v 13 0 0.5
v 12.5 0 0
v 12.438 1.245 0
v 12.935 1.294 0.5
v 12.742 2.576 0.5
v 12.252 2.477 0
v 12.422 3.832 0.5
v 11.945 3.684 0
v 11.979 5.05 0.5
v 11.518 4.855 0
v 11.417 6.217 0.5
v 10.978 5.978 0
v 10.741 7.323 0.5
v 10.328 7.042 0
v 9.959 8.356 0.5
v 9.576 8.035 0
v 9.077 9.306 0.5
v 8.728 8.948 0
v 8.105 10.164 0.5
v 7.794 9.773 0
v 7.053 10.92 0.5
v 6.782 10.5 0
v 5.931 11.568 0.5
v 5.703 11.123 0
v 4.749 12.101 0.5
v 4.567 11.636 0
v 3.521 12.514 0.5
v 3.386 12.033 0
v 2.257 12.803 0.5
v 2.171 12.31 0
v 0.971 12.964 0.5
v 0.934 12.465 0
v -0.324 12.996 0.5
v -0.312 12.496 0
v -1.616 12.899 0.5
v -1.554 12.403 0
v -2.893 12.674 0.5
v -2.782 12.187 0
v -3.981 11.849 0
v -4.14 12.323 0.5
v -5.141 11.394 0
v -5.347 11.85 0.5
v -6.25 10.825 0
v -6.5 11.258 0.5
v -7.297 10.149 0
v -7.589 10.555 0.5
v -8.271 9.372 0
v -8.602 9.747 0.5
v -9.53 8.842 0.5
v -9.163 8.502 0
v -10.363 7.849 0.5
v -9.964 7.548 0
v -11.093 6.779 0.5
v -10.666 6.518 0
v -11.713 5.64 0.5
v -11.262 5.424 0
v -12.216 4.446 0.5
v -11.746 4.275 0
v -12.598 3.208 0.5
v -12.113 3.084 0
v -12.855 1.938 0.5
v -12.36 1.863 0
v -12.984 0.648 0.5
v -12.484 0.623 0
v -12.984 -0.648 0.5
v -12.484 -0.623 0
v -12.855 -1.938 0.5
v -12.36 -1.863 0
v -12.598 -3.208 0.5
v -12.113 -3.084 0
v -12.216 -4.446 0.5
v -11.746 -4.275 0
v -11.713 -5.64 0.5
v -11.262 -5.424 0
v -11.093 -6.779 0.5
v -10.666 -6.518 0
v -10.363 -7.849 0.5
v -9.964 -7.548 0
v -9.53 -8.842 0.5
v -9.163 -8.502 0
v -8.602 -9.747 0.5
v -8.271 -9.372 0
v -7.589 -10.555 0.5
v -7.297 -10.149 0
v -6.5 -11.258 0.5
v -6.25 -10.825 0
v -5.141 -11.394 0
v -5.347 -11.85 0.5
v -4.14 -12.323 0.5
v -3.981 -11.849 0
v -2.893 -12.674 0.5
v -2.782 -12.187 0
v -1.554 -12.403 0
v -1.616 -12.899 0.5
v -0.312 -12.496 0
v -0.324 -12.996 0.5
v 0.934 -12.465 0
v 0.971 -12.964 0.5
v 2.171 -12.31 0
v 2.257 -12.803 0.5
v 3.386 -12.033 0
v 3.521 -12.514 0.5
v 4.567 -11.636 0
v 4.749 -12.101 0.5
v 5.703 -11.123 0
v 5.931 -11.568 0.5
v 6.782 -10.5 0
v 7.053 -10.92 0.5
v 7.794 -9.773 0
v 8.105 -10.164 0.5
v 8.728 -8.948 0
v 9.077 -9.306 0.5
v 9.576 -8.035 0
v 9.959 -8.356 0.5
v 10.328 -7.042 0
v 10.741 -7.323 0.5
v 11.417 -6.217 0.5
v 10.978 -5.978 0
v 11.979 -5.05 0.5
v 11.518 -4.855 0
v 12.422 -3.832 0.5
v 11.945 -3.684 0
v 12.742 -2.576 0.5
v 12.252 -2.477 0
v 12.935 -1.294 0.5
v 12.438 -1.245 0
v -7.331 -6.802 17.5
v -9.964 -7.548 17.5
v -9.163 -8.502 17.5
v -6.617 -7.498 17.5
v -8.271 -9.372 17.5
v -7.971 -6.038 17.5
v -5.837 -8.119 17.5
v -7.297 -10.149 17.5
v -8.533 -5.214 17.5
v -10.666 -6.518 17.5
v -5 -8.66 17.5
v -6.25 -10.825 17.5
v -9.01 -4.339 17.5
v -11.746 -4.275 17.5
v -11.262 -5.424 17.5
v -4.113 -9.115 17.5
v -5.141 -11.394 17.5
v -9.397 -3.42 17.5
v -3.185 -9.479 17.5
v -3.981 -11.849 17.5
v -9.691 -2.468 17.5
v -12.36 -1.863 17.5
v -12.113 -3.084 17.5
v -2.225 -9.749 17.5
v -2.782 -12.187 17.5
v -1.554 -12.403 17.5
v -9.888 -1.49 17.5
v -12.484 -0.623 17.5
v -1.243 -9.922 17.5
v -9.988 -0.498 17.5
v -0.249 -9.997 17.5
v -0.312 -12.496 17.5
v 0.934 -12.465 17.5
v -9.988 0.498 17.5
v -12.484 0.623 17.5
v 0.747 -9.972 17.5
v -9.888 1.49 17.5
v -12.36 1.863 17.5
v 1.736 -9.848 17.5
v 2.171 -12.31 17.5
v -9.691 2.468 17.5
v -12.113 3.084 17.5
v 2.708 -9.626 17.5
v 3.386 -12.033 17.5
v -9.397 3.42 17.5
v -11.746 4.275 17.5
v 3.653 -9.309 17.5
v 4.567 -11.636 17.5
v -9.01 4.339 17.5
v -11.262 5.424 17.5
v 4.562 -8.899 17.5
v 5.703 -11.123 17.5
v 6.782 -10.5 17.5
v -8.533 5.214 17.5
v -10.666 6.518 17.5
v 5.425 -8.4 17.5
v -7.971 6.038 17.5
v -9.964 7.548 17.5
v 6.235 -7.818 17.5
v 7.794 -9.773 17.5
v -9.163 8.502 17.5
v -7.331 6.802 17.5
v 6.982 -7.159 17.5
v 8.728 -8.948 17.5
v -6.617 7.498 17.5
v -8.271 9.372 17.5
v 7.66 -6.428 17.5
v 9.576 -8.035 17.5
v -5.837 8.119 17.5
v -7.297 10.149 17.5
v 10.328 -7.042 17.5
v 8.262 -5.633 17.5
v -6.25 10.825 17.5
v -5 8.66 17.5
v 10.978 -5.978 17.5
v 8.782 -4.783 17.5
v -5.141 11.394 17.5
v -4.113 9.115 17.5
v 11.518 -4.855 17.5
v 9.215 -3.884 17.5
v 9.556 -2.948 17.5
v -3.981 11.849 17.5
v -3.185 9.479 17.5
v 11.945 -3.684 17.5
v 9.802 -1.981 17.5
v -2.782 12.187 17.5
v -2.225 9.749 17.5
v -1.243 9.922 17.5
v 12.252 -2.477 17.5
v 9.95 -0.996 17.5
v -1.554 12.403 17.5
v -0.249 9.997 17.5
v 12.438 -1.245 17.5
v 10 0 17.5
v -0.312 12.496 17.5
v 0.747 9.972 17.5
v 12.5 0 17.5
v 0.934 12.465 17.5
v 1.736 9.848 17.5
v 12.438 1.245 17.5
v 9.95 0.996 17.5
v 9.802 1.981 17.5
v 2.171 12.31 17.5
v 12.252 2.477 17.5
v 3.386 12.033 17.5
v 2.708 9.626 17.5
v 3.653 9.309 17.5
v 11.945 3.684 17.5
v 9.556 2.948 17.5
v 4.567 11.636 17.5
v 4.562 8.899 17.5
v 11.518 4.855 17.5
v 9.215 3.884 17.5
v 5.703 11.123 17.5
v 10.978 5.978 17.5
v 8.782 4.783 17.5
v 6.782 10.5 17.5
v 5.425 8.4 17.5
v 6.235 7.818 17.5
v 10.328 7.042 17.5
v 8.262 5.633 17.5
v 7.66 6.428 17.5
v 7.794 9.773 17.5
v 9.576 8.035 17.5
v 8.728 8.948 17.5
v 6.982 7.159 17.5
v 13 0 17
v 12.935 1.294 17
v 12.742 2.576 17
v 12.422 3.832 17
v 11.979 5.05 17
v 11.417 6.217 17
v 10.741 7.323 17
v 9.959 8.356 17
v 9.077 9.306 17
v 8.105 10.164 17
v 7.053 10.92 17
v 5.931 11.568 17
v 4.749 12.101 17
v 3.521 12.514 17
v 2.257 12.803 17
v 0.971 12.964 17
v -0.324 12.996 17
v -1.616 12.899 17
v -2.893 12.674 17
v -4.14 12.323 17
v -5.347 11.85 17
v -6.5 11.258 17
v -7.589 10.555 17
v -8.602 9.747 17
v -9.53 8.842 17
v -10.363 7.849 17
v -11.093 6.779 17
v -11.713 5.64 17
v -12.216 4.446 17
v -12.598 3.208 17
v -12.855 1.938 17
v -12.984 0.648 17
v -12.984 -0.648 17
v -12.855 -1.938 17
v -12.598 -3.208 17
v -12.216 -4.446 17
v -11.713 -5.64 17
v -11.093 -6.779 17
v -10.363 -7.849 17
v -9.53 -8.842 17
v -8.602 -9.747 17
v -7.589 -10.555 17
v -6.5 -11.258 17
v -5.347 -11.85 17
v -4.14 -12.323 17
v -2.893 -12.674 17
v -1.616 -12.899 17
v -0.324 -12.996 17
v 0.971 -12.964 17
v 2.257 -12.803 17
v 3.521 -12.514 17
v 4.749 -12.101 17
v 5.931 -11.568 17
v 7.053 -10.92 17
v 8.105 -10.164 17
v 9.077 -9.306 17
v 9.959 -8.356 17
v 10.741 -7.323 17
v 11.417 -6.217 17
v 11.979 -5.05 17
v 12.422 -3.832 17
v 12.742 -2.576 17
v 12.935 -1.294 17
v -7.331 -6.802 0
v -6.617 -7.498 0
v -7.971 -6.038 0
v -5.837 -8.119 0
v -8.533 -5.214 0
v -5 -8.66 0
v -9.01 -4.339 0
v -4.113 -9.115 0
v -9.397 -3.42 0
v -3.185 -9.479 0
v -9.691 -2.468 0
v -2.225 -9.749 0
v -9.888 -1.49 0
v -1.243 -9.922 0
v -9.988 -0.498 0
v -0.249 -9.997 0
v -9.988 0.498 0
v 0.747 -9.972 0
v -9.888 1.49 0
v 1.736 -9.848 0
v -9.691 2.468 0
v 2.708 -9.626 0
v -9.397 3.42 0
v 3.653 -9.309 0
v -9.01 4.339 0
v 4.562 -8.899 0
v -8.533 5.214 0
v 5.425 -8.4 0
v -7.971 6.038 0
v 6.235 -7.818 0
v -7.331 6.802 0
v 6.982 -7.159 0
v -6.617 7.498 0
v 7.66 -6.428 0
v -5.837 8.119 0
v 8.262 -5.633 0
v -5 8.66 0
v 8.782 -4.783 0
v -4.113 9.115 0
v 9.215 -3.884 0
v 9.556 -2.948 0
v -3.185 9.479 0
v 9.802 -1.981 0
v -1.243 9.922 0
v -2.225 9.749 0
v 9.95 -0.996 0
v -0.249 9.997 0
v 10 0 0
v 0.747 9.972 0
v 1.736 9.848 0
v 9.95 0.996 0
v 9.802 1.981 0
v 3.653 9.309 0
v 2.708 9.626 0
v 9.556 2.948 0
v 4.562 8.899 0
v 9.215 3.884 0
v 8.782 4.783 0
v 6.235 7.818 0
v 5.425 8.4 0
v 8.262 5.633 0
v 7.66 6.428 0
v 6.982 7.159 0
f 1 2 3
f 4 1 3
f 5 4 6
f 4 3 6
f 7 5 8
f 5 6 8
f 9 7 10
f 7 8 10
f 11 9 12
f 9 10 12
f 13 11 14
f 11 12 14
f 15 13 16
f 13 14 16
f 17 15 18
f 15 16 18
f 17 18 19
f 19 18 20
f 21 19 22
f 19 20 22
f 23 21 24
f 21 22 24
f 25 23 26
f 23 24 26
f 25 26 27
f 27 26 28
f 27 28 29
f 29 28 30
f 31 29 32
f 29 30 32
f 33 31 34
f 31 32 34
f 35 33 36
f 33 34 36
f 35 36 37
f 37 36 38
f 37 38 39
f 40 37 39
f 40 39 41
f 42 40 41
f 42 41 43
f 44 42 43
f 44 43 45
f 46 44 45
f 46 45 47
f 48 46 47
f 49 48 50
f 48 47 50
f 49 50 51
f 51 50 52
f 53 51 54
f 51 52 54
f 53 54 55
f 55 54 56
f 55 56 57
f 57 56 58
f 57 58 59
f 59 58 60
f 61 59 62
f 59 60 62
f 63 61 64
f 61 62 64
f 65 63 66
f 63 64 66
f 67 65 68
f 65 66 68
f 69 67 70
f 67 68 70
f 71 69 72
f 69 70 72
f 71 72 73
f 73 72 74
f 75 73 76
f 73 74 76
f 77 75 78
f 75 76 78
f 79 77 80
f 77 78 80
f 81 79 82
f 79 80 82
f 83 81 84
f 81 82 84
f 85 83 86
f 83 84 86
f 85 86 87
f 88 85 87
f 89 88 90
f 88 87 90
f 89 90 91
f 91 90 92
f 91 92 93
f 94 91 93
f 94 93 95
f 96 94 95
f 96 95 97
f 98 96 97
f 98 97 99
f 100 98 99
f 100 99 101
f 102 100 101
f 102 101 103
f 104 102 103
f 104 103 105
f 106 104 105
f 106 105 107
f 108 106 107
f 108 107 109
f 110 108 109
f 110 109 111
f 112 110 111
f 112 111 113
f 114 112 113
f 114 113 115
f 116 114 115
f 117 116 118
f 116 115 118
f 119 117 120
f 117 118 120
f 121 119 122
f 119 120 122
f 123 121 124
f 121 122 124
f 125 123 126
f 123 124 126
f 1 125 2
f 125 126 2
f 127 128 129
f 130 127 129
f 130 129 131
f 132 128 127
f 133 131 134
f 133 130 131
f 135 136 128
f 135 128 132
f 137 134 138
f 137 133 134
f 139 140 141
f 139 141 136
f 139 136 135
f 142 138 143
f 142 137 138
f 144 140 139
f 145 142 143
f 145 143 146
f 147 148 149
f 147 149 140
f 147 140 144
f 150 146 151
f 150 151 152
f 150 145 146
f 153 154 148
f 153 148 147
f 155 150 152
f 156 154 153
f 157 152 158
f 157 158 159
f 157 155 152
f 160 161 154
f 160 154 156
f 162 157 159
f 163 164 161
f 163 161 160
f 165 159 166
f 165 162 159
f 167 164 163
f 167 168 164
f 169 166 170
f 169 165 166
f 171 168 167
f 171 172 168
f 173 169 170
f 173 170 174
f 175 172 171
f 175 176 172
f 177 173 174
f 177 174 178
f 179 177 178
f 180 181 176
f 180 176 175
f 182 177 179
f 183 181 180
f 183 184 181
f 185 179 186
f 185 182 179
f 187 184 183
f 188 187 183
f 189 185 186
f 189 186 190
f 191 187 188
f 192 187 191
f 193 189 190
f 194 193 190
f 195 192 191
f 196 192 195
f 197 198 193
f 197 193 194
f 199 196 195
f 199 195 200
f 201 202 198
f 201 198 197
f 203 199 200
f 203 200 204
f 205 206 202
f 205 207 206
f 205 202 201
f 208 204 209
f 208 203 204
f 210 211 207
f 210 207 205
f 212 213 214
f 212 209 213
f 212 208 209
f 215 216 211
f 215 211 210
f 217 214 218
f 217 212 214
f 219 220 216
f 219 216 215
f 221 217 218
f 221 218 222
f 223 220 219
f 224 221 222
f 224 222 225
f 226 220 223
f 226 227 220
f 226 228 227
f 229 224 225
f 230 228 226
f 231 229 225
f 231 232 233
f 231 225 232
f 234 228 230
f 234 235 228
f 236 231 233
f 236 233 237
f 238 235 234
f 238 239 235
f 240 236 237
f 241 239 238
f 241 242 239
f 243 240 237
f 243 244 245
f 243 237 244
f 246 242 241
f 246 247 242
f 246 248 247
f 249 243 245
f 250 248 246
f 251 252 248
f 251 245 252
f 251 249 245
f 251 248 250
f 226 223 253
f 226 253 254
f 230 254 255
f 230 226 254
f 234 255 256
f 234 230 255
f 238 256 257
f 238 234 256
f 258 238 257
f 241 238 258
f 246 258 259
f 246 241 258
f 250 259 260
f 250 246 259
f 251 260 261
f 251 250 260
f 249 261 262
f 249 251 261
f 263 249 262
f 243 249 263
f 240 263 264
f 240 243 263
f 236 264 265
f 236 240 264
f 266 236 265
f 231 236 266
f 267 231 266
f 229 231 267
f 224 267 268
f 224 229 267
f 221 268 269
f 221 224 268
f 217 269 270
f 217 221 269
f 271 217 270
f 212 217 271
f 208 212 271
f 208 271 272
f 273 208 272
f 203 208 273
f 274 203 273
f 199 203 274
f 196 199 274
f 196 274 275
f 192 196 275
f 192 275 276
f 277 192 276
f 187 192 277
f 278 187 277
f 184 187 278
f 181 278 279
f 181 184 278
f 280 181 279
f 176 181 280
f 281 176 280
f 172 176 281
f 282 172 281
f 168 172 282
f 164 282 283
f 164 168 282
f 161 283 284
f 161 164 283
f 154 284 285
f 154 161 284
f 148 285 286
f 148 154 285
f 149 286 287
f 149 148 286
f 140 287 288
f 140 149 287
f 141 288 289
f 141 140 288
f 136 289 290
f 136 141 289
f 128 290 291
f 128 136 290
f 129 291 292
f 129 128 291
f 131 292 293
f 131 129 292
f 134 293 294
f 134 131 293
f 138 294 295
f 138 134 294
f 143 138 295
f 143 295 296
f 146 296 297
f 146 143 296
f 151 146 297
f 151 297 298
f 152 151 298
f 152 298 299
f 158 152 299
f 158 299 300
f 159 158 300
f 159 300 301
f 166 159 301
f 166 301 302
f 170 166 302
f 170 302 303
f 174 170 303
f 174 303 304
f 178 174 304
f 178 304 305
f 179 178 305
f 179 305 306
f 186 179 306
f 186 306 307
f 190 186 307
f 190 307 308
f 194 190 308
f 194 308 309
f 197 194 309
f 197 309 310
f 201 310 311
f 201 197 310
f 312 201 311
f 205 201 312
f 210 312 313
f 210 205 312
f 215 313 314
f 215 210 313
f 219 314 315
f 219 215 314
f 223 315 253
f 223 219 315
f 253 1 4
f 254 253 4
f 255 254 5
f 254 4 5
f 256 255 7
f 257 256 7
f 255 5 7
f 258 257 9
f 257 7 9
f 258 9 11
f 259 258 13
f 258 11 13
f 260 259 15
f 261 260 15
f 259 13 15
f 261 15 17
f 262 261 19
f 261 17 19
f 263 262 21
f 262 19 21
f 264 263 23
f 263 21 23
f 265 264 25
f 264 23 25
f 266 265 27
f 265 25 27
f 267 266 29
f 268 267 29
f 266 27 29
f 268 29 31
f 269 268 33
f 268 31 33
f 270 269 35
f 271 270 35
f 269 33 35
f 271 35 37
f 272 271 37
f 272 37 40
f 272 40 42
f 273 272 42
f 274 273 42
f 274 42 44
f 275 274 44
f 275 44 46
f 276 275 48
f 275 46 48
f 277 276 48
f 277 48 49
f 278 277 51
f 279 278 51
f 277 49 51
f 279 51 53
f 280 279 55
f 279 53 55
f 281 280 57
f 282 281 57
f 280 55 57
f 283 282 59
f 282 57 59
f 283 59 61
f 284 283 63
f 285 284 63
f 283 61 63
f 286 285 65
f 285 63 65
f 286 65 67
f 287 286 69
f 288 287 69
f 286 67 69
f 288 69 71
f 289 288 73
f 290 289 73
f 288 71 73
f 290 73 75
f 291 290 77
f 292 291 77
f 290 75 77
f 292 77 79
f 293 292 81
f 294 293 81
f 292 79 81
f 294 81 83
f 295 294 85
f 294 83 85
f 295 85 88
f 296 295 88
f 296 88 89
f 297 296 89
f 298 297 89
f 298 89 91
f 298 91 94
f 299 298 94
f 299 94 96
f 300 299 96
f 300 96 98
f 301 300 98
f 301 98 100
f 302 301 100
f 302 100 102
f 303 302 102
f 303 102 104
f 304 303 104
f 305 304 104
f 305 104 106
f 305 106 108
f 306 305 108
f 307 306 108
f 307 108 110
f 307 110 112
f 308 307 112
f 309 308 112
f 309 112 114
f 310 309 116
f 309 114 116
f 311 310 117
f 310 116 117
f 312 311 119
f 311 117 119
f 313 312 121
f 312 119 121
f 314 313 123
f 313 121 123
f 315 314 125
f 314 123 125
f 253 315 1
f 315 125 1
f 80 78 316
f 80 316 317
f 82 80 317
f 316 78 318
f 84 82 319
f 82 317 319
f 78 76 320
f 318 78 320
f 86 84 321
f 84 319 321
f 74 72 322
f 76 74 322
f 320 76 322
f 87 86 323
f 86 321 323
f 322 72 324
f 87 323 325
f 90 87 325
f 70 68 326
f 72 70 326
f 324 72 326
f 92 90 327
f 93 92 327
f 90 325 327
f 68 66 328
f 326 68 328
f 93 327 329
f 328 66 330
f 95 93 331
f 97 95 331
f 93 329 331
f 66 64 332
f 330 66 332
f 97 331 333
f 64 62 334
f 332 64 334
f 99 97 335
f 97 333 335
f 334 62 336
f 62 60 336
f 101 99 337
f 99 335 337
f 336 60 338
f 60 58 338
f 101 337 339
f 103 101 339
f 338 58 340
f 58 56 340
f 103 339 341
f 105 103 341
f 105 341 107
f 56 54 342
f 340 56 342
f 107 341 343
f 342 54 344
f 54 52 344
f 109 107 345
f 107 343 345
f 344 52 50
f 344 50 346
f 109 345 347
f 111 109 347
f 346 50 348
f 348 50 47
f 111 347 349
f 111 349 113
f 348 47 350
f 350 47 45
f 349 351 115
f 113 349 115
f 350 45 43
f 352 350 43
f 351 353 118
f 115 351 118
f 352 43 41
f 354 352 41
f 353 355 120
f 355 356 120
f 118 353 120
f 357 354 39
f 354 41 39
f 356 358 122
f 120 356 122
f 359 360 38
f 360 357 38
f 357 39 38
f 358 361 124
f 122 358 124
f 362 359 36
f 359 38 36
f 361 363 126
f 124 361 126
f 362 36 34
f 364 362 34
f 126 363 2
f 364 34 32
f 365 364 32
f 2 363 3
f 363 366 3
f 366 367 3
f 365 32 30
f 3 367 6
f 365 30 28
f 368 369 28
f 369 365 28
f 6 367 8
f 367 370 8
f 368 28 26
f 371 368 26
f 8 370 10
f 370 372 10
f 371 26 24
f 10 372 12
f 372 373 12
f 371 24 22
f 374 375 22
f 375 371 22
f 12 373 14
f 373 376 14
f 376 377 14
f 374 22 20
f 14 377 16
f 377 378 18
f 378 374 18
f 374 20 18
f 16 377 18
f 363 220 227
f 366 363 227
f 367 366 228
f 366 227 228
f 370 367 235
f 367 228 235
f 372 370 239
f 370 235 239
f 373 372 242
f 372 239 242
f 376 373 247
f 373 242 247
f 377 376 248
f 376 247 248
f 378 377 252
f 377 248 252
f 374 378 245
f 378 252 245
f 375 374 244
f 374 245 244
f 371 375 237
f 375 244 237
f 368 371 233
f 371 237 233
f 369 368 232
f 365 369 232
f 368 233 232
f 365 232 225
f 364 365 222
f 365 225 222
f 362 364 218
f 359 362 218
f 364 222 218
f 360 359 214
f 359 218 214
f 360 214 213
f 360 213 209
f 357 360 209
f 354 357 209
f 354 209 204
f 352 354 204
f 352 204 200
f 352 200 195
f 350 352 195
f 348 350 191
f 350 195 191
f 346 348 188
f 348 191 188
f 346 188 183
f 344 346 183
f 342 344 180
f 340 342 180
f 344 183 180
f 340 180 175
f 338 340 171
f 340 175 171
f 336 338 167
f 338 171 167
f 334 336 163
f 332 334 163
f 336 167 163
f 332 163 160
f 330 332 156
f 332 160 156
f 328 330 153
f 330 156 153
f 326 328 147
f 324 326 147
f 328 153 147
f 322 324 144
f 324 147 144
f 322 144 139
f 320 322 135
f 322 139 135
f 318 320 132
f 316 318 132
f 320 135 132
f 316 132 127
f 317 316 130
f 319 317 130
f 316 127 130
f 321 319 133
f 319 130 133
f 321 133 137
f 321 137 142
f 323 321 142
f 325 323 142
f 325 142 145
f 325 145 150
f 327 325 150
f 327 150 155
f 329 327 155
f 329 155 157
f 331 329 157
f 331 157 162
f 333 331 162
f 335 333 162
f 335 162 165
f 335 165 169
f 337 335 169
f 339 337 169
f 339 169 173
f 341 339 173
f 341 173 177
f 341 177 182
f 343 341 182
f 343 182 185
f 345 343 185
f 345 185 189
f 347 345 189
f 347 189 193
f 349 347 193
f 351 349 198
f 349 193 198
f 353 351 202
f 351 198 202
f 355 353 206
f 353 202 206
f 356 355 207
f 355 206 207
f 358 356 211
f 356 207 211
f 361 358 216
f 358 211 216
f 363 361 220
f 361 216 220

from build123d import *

# Parameters (mm, degrees)
SKETCH_1_R          = 13
EXTRUDE_1_DEPTH     = 17.5
SKETCH_2_R          = 10
CUT_EXTRUDE_1_DEPTH = 17.5
CHAMFER_1_SIZE      = 0.5


with BuildPart() as part:
    # 草图1 → 凸台-拉伸1 (new body)
    with BuildSketch(Plane.XY):
        Circle(SKETCH_1_R)
    extrude(amount=EXTRUDE_1_DEPTH)

    # 草图2 → 切除-拉伸1 (cut)
    with BuildSketch(Plane.XY.offset(17.5)):
        Circle(SKETCH_2_R)
    extrude(amount=-CUT_EXTRUDE_1_DEPTH, mode=Mode.SUBTRACT)

    # 倒角1
    chamfer_1_edges = [part.edges().sort_by_distance(p)[0] for p in [
        (-13, 0, 0),
        (-13, 0, 17.5),
    ]]
    chamfer(chamfer_1_edges, length=CHAMFER_1_SIZE)


solid = part.part
